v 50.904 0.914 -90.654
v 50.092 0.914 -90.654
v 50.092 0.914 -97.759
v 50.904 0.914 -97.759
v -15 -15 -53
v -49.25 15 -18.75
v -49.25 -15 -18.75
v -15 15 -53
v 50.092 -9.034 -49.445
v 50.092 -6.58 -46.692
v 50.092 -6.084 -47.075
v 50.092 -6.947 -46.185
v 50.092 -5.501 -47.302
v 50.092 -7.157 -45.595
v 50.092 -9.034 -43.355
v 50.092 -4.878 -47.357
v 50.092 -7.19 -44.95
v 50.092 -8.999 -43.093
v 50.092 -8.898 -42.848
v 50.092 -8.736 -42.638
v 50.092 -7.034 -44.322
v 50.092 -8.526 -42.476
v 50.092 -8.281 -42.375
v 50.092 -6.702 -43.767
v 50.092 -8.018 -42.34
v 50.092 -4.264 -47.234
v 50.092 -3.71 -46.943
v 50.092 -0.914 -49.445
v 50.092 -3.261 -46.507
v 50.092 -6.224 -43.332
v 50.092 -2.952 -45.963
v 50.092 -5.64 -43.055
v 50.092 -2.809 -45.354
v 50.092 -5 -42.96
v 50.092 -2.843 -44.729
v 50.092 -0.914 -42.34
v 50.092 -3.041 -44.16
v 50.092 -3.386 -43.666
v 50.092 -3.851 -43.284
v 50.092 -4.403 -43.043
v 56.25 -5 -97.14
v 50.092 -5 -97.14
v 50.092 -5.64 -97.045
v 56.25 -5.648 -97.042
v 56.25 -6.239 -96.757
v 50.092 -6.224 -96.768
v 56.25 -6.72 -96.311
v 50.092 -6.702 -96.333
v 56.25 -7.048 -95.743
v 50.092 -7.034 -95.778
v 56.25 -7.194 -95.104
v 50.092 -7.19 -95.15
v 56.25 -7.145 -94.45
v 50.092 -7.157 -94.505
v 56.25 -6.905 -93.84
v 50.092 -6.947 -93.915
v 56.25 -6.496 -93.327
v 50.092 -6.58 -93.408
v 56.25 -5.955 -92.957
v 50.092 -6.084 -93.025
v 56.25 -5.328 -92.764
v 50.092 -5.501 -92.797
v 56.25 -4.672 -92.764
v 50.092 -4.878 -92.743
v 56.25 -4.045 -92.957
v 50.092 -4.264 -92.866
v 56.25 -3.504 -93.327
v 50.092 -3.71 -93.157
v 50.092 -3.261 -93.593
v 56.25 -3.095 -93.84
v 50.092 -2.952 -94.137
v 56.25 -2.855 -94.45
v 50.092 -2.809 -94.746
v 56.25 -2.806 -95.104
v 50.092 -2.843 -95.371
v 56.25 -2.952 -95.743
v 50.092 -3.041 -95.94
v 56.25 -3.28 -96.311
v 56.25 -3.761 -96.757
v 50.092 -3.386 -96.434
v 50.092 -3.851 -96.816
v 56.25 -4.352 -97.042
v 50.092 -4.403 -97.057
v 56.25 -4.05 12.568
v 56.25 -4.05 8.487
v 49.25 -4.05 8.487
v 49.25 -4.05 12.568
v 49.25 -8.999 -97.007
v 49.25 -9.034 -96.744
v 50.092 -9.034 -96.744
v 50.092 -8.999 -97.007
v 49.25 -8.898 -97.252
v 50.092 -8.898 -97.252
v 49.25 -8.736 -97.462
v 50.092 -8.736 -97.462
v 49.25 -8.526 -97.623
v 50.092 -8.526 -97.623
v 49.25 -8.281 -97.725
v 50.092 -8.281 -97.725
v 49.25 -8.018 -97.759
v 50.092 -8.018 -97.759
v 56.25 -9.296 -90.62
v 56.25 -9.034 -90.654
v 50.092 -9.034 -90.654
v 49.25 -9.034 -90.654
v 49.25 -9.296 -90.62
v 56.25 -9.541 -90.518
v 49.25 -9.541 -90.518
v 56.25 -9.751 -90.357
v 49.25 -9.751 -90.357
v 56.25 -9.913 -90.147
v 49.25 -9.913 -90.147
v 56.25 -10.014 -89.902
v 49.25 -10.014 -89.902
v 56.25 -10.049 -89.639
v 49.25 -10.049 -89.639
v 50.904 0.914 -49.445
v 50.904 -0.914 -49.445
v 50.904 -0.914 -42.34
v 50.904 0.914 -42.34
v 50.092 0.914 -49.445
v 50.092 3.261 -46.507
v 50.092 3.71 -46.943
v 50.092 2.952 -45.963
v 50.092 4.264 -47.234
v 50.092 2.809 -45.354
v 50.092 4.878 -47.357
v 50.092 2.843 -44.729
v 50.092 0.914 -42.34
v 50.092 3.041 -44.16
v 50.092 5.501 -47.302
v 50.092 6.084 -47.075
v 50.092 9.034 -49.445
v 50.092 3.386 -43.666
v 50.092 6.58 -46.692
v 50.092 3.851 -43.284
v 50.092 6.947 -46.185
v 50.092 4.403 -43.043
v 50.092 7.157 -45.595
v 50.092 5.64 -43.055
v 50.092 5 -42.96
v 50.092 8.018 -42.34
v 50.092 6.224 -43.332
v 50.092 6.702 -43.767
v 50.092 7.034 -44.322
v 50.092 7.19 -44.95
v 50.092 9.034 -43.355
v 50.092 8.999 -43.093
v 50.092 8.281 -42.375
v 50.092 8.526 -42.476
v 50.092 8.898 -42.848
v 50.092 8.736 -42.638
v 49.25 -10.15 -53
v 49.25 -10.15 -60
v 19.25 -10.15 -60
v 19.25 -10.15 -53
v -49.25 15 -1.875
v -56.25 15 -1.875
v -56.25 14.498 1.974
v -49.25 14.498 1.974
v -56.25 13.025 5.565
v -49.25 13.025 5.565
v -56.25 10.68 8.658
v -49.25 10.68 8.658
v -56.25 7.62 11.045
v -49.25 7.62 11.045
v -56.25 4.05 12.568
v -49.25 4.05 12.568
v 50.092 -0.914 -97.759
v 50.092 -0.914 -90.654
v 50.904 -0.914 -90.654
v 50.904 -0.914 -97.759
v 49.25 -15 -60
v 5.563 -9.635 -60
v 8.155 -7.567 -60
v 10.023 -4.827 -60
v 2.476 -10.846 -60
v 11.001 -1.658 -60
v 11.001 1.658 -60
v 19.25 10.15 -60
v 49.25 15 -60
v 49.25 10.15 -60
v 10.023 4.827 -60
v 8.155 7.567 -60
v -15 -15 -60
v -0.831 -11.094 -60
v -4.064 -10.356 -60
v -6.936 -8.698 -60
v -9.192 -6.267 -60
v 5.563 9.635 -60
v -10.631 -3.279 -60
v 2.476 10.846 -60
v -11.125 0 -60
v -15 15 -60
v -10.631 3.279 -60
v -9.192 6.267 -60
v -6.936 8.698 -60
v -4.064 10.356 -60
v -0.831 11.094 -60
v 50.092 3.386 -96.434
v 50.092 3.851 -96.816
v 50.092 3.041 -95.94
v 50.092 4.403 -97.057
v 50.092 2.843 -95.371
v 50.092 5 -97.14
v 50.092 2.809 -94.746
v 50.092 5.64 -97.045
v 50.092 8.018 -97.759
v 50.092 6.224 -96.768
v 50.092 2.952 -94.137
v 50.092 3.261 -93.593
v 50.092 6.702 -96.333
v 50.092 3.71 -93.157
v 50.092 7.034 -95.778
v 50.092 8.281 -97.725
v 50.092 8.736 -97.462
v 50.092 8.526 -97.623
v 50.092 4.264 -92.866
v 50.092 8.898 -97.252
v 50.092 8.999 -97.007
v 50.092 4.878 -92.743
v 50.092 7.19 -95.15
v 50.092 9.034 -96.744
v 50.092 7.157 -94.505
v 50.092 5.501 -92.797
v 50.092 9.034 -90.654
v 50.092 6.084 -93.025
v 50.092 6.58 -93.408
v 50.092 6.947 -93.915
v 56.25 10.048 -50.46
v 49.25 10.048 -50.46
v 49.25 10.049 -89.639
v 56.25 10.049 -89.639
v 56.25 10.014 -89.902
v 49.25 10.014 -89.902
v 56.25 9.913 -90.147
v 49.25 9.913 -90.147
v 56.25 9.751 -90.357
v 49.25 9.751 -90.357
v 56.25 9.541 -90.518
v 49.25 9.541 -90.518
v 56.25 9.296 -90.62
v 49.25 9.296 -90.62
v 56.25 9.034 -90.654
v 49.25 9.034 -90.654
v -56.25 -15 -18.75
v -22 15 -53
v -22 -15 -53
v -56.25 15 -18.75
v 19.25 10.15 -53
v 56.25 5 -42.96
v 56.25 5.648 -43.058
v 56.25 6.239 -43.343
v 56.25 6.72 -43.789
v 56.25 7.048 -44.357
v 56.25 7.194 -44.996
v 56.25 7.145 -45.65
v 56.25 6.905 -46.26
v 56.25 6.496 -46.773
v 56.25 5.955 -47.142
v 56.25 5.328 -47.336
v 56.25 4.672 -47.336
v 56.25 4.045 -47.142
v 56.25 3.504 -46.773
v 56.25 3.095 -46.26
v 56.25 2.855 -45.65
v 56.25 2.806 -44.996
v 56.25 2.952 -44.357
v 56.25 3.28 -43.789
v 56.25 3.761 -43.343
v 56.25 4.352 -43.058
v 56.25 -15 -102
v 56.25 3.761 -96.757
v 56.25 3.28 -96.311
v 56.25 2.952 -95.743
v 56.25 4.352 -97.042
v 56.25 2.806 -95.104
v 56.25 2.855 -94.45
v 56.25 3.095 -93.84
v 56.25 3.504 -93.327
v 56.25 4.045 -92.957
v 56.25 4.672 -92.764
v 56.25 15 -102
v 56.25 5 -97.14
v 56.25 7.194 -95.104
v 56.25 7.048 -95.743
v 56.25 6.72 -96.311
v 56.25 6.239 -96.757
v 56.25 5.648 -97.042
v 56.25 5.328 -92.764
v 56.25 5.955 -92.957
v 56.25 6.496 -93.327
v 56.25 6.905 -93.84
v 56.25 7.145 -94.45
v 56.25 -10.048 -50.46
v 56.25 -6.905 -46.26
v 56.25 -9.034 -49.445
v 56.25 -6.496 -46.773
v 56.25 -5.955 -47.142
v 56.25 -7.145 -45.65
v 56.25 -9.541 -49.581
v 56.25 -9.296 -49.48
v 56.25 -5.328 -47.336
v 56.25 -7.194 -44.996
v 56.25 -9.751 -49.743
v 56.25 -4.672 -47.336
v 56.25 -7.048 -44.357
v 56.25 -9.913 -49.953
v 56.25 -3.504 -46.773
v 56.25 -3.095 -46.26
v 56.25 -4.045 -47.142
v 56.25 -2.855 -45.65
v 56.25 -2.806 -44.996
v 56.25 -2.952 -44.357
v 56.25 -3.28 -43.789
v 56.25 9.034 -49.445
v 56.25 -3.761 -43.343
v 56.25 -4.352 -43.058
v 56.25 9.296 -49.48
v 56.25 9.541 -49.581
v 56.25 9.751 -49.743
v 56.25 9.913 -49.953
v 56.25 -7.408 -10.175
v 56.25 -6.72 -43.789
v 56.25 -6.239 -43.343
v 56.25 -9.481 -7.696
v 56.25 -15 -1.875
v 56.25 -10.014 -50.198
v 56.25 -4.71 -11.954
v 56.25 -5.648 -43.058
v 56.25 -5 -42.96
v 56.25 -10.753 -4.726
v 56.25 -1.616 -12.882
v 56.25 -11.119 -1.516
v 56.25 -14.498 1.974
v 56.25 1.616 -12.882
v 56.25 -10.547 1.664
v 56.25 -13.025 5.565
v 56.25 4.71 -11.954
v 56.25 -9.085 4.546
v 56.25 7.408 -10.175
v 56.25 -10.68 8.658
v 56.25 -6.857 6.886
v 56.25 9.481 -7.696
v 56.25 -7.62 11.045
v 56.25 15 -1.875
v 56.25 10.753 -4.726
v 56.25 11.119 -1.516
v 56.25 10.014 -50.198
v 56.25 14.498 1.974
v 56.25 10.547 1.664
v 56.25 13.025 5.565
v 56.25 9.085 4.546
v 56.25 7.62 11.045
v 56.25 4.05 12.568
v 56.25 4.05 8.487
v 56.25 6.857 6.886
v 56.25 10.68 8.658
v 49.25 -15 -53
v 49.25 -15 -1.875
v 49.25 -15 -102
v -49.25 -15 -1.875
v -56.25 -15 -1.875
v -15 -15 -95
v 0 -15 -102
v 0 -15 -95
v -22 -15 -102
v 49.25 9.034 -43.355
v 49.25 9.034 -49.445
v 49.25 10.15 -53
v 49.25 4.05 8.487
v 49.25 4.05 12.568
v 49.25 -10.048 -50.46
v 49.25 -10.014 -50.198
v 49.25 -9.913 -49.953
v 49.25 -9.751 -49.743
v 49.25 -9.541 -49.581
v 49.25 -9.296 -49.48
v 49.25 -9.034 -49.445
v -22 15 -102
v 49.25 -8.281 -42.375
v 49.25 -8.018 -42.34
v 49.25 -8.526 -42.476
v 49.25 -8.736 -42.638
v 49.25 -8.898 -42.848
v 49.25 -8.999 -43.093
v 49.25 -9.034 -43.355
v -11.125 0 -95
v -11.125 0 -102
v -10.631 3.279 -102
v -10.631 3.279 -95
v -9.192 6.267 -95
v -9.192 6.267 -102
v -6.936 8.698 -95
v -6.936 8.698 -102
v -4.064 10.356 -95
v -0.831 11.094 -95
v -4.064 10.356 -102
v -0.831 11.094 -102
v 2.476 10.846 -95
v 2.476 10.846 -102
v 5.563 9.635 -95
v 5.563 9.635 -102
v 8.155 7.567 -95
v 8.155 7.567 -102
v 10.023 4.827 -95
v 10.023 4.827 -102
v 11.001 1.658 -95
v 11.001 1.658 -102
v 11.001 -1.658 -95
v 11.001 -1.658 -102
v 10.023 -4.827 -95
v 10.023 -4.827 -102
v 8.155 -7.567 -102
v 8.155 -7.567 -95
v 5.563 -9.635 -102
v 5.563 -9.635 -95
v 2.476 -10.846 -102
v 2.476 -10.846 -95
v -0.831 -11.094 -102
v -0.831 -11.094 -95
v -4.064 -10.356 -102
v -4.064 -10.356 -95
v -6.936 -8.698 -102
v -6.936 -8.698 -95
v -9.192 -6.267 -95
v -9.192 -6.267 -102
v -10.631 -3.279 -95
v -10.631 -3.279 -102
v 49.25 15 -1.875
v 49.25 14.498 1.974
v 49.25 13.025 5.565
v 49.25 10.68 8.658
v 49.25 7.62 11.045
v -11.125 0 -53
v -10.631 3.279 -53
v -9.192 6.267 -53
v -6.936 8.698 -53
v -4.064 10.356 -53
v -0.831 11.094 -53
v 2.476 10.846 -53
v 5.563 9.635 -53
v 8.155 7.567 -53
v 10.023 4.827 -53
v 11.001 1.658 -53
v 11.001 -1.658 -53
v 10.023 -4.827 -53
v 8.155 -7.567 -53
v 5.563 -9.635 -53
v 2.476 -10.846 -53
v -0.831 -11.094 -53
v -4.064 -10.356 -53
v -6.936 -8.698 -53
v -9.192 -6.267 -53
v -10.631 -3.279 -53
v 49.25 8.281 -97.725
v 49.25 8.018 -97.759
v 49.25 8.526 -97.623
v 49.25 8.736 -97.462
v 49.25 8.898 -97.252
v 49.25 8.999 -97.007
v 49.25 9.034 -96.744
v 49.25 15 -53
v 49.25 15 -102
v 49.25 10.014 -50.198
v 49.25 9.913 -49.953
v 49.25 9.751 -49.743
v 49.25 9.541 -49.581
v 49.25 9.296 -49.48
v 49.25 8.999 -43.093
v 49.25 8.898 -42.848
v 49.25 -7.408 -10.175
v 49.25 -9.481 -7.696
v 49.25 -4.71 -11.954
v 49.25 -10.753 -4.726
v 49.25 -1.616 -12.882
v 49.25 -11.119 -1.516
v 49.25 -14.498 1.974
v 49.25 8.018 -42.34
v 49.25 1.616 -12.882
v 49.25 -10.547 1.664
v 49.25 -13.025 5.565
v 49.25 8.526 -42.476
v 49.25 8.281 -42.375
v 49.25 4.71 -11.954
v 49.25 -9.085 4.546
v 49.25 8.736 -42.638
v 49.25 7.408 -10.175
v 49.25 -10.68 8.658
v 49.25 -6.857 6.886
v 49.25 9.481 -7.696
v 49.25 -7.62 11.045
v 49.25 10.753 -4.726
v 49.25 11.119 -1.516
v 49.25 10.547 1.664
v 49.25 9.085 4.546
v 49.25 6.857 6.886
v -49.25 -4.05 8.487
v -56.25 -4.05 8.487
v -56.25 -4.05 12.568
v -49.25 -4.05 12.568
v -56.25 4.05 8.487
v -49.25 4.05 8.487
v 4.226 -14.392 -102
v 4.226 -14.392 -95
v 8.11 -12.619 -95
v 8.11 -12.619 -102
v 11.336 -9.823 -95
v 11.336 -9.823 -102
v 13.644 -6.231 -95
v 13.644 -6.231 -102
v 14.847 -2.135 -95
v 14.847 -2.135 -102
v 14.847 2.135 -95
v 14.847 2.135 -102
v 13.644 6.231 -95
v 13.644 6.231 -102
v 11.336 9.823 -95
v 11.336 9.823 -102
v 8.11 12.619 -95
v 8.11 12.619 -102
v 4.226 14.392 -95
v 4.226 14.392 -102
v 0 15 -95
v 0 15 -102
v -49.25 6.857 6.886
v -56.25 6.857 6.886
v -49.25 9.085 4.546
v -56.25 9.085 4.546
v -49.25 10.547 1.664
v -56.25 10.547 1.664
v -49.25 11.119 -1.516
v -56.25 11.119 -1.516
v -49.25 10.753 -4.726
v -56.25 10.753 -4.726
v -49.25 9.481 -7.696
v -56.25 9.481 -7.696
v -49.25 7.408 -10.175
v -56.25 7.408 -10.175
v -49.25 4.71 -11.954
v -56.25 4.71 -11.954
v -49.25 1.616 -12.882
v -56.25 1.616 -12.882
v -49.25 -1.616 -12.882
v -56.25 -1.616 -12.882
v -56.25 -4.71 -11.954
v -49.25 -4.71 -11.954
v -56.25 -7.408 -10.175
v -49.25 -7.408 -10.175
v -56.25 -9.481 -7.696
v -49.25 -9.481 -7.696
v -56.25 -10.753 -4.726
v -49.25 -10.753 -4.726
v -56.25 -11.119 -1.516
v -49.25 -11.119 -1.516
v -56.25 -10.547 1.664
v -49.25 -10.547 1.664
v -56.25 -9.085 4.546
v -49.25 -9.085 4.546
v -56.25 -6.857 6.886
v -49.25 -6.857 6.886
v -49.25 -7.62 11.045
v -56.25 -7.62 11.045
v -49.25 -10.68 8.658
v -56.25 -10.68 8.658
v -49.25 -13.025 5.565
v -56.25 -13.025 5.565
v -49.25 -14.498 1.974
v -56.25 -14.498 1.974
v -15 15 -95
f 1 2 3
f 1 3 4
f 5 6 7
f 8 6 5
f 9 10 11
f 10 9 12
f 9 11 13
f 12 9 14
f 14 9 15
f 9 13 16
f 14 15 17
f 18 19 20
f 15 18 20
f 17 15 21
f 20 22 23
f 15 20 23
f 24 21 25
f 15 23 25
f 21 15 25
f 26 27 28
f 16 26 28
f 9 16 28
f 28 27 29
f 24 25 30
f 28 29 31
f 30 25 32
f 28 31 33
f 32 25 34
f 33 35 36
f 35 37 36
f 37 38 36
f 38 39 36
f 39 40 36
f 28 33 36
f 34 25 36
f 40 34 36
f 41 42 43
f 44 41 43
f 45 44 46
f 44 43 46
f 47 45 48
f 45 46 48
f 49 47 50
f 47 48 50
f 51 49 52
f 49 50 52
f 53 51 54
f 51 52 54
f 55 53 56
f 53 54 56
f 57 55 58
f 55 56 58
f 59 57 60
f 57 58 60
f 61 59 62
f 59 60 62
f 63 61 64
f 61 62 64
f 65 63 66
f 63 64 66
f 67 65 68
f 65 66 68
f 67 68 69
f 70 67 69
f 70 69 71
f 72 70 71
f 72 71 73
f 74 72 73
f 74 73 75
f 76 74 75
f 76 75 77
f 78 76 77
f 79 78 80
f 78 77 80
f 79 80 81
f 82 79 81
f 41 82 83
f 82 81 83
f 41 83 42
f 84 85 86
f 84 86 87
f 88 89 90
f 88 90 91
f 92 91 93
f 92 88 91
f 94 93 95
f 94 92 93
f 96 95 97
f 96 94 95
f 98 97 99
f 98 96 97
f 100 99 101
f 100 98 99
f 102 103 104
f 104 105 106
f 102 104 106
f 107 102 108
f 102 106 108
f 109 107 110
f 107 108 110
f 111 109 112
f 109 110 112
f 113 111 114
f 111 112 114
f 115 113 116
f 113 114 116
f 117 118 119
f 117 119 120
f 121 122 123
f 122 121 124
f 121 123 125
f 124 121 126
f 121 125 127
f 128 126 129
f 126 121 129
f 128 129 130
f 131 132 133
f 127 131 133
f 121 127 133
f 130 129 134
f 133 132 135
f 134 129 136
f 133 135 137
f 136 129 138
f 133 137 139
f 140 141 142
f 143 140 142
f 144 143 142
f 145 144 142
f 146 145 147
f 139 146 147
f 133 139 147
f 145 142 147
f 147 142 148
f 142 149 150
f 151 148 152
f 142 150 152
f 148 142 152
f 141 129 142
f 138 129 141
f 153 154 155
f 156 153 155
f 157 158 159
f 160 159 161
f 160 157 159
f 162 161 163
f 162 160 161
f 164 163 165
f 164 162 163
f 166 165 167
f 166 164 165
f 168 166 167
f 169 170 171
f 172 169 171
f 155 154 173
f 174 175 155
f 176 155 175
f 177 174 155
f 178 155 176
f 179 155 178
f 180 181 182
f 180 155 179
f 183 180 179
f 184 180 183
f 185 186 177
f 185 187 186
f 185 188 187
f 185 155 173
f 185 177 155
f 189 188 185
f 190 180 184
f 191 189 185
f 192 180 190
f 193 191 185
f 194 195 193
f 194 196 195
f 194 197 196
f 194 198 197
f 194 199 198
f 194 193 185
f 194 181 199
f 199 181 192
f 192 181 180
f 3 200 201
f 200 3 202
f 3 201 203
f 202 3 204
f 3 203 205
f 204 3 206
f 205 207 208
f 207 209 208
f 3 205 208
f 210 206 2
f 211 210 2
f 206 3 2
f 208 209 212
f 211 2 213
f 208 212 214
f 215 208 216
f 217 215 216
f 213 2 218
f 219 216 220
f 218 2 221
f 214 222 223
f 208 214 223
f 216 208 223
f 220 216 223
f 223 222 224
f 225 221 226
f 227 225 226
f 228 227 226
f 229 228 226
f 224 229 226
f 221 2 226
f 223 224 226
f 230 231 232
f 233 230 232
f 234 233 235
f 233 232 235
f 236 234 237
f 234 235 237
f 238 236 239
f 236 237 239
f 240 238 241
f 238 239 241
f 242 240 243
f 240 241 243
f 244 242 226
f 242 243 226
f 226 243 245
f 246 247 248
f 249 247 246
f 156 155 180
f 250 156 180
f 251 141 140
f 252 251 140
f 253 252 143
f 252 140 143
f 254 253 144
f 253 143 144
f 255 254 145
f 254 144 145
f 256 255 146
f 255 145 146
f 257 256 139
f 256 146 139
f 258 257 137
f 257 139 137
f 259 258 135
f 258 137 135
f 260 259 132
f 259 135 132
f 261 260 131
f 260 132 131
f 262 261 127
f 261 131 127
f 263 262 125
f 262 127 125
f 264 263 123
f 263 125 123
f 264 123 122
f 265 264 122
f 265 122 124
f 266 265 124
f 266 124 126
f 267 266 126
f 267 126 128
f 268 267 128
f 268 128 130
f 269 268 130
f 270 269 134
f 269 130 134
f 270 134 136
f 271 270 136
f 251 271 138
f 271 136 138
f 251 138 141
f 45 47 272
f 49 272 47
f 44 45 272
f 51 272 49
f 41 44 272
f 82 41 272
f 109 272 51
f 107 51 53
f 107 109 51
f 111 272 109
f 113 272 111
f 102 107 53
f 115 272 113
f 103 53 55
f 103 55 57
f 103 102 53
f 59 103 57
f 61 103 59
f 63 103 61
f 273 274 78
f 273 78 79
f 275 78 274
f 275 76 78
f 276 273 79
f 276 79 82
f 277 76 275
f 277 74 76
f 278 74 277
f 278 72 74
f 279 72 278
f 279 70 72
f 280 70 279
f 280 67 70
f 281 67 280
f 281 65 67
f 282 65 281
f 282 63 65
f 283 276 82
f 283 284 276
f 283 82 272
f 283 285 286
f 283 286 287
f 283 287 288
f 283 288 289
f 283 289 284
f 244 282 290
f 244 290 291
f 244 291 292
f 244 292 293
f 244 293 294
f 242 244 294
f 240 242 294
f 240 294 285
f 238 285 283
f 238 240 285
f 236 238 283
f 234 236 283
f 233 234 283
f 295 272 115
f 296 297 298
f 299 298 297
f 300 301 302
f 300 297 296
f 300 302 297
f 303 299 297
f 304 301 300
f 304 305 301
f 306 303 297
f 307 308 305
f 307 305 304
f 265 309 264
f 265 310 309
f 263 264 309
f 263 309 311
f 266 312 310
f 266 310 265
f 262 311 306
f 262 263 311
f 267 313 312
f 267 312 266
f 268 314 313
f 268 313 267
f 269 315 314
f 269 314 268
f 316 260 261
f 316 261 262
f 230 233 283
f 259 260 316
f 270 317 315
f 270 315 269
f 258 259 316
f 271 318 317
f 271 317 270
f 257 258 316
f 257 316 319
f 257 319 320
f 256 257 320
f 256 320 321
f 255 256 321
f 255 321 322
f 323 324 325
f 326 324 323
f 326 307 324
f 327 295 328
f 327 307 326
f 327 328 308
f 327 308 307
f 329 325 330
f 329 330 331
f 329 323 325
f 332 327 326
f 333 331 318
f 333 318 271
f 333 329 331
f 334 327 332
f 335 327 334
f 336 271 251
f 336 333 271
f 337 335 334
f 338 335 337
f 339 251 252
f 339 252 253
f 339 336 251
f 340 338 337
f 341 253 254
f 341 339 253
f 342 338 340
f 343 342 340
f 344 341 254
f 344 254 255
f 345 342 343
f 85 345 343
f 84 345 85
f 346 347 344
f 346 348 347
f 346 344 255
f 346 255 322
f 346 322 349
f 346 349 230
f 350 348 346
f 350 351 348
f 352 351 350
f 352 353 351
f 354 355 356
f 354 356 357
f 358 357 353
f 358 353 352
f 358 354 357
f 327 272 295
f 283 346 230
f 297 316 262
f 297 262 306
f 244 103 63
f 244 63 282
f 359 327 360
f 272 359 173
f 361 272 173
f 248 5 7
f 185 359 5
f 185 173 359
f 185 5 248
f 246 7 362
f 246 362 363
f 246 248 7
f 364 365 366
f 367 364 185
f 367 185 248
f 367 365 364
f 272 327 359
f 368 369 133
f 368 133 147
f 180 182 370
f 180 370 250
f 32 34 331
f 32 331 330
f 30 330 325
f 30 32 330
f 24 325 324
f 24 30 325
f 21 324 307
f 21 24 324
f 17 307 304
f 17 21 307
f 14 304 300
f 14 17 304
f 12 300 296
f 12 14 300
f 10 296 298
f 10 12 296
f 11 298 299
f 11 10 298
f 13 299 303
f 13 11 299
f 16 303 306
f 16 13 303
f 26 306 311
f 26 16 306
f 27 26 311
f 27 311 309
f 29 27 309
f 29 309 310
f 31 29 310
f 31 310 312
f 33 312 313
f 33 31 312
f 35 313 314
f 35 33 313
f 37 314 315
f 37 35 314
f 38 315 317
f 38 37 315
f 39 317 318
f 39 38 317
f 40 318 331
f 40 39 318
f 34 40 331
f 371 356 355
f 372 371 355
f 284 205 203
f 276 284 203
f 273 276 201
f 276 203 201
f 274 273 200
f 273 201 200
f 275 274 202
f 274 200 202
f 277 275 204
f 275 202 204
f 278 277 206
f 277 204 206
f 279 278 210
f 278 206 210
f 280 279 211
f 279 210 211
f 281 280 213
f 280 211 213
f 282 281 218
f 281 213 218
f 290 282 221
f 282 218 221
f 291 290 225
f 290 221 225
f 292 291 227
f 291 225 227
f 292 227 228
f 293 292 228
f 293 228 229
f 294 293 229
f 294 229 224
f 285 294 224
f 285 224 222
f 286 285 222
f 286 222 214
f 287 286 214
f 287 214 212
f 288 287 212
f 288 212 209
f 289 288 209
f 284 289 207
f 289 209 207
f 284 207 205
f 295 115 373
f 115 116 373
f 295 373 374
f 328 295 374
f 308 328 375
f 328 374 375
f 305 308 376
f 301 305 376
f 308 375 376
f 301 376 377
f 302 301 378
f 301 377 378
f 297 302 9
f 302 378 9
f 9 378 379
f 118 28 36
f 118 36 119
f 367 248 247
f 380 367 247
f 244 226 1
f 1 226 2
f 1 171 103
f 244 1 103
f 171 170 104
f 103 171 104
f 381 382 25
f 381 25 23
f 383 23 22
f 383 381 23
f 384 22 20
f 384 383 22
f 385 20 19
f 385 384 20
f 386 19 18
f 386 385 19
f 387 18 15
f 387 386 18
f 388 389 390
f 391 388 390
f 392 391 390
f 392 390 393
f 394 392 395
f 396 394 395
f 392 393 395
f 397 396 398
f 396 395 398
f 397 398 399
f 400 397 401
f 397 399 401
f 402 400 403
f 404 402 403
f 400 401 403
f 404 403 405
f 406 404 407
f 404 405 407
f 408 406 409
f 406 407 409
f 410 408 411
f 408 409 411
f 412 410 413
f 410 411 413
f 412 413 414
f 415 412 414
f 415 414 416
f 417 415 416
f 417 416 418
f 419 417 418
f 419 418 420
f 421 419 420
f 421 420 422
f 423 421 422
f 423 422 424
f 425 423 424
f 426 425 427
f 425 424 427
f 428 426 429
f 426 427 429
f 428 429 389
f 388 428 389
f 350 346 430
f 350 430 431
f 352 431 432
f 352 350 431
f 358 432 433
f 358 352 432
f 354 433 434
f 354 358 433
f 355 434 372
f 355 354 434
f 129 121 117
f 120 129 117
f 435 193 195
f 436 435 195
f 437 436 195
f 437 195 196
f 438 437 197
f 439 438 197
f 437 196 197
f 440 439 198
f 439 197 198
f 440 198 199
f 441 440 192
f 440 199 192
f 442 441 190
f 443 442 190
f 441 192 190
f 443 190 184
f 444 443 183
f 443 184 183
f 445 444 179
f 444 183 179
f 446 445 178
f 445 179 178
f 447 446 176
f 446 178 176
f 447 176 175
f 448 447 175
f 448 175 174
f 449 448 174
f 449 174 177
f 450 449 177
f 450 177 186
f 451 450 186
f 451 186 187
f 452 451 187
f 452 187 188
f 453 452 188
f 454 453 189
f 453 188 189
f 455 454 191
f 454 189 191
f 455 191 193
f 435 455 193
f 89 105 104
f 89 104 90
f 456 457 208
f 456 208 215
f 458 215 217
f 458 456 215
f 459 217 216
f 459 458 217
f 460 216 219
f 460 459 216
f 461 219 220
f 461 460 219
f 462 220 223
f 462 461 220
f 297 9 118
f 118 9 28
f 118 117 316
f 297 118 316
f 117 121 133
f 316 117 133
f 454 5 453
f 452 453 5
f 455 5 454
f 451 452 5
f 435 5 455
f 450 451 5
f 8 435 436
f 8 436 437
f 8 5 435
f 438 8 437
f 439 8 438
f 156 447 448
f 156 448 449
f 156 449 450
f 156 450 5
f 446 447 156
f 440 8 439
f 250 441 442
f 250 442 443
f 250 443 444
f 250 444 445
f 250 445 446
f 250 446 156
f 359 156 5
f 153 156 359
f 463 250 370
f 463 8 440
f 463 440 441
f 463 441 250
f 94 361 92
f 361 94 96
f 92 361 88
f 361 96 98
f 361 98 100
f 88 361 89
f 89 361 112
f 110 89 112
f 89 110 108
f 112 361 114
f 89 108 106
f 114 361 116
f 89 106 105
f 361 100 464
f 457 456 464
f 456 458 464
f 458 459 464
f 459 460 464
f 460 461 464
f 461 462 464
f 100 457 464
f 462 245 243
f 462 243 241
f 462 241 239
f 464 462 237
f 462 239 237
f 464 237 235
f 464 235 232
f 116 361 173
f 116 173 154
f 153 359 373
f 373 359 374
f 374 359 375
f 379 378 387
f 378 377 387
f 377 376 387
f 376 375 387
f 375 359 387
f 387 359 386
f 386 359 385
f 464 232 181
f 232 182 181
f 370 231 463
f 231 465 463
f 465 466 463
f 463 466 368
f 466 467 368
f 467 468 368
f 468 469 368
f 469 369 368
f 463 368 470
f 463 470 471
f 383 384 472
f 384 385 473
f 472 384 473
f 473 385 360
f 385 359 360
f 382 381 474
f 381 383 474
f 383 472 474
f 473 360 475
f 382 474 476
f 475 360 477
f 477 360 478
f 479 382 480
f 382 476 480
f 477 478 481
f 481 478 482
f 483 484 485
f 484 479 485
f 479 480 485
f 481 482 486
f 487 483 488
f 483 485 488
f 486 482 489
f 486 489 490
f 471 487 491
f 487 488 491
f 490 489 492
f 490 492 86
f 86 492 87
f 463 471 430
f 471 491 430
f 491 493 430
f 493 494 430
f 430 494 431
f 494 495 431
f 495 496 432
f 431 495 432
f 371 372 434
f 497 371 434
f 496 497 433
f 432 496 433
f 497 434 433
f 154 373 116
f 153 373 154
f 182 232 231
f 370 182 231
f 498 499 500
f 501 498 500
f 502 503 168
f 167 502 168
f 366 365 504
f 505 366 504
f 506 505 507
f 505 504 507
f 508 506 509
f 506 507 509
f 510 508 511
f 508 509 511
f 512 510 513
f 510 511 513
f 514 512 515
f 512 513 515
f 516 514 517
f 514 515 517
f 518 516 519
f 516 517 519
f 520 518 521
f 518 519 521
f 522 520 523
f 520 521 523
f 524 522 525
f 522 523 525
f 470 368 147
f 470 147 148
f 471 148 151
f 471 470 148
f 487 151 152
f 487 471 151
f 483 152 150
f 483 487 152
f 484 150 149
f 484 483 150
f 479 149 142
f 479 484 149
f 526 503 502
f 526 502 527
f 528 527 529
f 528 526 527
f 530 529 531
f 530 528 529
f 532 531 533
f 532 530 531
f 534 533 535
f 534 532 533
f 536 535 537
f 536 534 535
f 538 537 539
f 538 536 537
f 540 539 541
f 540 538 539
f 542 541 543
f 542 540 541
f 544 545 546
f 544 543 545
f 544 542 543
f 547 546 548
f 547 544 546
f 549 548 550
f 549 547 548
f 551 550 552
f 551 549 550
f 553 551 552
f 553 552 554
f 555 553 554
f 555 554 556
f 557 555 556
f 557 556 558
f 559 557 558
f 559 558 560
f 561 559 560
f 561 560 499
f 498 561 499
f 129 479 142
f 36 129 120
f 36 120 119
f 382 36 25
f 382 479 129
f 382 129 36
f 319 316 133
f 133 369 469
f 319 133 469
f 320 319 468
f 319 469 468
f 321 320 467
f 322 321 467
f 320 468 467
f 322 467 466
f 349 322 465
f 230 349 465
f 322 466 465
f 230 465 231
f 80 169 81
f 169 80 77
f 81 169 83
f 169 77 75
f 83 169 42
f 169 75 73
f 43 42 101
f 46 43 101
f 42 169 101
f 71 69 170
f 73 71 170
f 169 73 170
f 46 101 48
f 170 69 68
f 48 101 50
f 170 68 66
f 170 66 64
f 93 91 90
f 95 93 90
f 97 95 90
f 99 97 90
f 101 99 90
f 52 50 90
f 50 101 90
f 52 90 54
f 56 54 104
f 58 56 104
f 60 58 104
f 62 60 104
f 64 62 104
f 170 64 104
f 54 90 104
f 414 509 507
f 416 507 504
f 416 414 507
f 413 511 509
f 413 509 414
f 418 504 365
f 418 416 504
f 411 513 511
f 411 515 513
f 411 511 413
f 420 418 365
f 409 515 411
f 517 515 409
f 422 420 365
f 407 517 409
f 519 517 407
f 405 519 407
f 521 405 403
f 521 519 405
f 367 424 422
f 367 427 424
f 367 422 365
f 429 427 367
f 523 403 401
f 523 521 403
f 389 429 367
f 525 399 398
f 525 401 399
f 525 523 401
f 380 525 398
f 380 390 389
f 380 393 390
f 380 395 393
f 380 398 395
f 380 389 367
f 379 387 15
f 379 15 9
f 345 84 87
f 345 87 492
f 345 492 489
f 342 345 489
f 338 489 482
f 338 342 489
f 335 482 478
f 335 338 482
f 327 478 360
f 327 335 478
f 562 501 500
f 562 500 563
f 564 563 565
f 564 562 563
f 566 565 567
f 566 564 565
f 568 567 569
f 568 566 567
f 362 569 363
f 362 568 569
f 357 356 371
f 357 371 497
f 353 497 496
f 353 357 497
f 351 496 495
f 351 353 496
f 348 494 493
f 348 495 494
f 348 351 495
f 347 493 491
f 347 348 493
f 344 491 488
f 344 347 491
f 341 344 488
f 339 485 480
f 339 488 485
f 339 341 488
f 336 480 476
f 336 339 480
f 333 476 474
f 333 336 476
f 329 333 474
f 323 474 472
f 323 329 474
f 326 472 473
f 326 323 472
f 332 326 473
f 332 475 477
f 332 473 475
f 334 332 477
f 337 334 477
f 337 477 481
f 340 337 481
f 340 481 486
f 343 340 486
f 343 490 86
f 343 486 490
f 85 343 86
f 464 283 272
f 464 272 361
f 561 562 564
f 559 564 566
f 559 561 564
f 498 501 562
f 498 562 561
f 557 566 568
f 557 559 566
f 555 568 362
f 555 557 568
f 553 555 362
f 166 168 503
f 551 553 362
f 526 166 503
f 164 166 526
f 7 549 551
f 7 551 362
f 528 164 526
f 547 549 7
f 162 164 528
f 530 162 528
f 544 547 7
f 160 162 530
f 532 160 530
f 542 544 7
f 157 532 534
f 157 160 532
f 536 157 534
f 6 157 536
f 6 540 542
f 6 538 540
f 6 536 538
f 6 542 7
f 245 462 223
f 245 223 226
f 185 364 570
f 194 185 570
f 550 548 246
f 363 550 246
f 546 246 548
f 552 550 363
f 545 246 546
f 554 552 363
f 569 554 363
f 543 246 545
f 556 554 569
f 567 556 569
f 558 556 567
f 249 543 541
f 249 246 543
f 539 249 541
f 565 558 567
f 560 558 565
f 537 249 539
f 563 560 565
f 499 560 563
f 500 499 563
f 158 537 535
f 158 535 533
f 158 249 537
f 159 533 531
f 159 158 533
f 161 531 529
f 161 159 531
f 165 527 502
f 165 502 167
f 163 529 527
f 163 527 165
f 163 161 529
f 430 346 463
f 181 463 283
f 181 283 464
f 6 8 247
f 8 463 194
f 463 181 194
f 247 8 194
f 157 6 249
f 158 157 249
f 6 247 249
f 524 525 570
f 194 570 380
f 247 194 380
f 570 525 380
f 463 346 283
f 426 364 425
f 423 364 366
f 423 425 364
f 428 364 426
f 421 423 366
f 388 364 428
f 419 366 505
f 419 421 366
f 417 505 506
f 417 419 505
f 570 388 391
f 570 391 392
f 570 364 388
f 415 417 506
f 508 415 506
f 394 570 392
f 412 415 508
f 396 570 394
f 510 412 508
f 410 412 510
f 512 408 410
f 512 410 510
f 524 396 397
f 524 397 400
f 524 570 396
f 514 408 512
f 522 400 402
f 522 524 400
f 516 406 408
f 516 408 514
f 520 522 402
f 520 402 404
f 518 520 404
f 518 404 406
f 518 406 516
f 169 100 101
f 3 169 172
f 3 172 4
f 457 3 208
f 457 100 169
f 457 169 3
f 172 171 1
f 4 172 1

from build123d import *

# Parameters (mm, degrees)
SKETCH1_W               = 7
SKETCH1_H               = 2
SKETCH1_H_2             = 22.25
BOSS_EXTRUDE1_DEPTH     = 15
CUT_EXTRUDE1_DEPTH      = 129.379320765
CUT_EXTRUDE1_DEPTH_BACK = 129.379320765
SKETCH2_R               = 11.125
SKETCH3_R               = 11.125
CUT_EXTRUDE2_DEPTH      = 7
SKETCH6_W               = 30
SKETCH6_H               = 20.3
CUT_EXTRUDE3_DEPTH      = 7
SKETCH7_R               = 2.2
CUT_EXTRUDE4_DEPTH      = 10
CAVITY3_START           = 49.25
CAVITY3_DEPTH           = 0.842
CAVITY3_2_DEPTH         = 6.6275
CAVITY3_START_2         = 55.8775
CAVITY3_3_DEPTH         = 0.3725
CAVITY3_START_3         = -0.9135
CAVITY3_4_DEPTH         = 1.827
CUT_EXTRUDE5_DEPTH      = 10
CUT_EXTRUDE6_DEPTH      = 0.842
CUT_EXTRUDE7_START      = -7.105
SKETCH10_W              = 0.812
SKETCH10_H              = 1.827
CUT_EXTRUDE7_DEPTH      = 7.105
SKETCH11_W              = 7
SKETCH11_H              = 30
BOSS_EXTRUDE2_DEPTH     = 42
CAVITY4_START           = 49.25
CAVITY4_DEPTH           = 7
CAVITY4_2_DEPTH         = 6.6275
CAVITY4_3_DEPTH         = 0.842
CAVITY4_START_2         = -0.9135
CAVITY4_4_DEPTH         = 1.827
CUT_EXTRUDE8_DEPTH      = 42
MIRROR3_COPY_1_SKETCH_R = 2.2
MIRROR3_COPY_1_DEPTH    = 10
MIRROR3_COPY_2_SKETCH_R = 2.2
MIRROR3_COPY_2_DEPTH    = 10
MIRROR3_COPY_3_DEPTH    = 0.842
CUT_EXTRUDE9_DEPTH      = 42
BOSS_EXTRUDE3_DEPTH     = 30
SKETCH15_R              = 11.125
BOSS_EXTRUDE4_DEPTH     = 7
BOSS_EXTRUDE5_REACH     = 131.007
SKETCH16_W              = 7
SKETCH16_H              = 30
SKETCH17_W              = 9.798681855
SKETCH17_H              = 8.1
CUT_EXTRUDE10_DEPTH     = 153.595052344


with BuildPart() as part:
    # Sketch1 → Boss-Extrude1 (new, symmetric)
    with BuildSketch(Plane(origin=(0, 0, 0), x_dir=(1, 0, 0), z_dir=(0, 1, 0))):
        with Locations((-52.75, -12.125)):
            Rectangle(SKETCH1_W, SKETCH1_H)
        with Locations((-52.75, 0)):
            Rectangle(SKETCH1_W, SKETCH1_H_2)
        Polygon((-49.25, 11.125), (-49.25, 53), (49.25, 53), (49.25, 11.125), (56.25, 11.125), (56.25, 60), (-56.25, 60), (-56.25, 11.125), align=None)
        with Locations((52.75, 0)):
            Rectangle(SKETCH1_W, SKETCH1_H_2)
        with Locations((52.75, -12.125)):
            Rectangle(SKETCH1_W, SKETCH1_H)
    extrude(amount=BOSS_EXTRUDE1_DEPTH, both=True)

    # Sketch2 → Cut-Extrude1 (cut, two sides: drawn at the far end of the back side and taken through both)
    with BuildSketch(Plane.ZY.offset(56.25).offset(-CUT_EXTRUDE1_DEPTH_BACK)):
        with Locations((-1.875, 0)):
            Circle(SKETCH2_R)
        with BuildLine():
            Line((13.125, 15), (-1.875, 15))
            ThreePointArc((-1.875, 15), (8.731601718, 10.606601718), (13.125, 0))
            Line((13.125, 0), (13.125, 15))
        make_face()
        with BuildLine():
            Line((13.125, -15), (13.125, 0))
            ThreePointArc((13.125, 0), (8.731601718, -10.606601718), (-1.875, -15))
            Line((-1.875, -15), (13.125, -15))
        make_face()
    extrude(amount=CUT_EXTRUDE1_DEPTH + CUT_EXTRUDE1_DEPTH_BACK, mode=Mode.SUBTRACT)

    # Sketch3 → Cut-Extrude2 (cut)
    with BuildSketch(Plane(origin=(0, 0, -60), x_dir=(-1, 0, 0), z_dir=(0, 0, -1))):
        Circle(SKETCH3_R)
    extrude(amount=-CUT_EXTRUDE2_DEPTH, mode=Mode.SUBTRACT)

    # Sketch6 → Cut-Extrude3 (cut)
    with BuildSketch(Plane(origin=(0, 0, -60), x_dir=(-1, 0, 0), z_dir=(0, 0, -1))):
        with Locations((-34.25, 0)):
            Rectangle(SKETCH6_W, SKETCH6_H)
    extrude(amount=-CUT_EXTRUDE3_DEPTH, mode=Mode.SUBTRACT)

    # Sketch7 → Cut-Extrude4 (cut)
    with BuildSketch(Plane.ZY.offset(-49.25)):
        with Locations((-45.160353728, 5)):
            Circle(SKETCH7_R)
    cut_extrude4 = extrude(amount=-CUT_EXTRUDE4_DEPTH, mode=Mode.SUBTRACT)

    # Cavity3: read off the stored shape, not the designer's step
    # Cavity3 outline → Cavity3 (cut)
    with BuildSketch(Plane.YZ.offset(CAVITY3_START)):
        with BuildLine():
            Line((-3.80625, -42.340467029), (-3.80625, -42.949467029))
            ThreePointArc((-3.80625, -42.949467029), (-5.075, -47.020009529), (-6.34375, -42.949467029))
            Line((-6.34375, -42.949467029), (-6.34375, -42.340467029))
            Line((-6.34375, -42.340467029), (-8.0185, -42.340467029))
            ThreePointArc((-8.0185, -42.340467029), (-8.736213383, -42.637753646), (-9.0335, -43.355467029))
            Line((-9.0335, -43.355467029), (-9.0335, -49.445467029))
            Line((-9.0335, -49.445467029), (9.0335, -49.445467029))
            Line((9.0335, -49.445467029), (9.0335, -43.355467029))
            ThreePointArc((9.0335, -43.355467029), (8.736213383, -42.637753646), (8.0185, -42.340467029))
            Line((8.0185, -42.340467029), (6.34375, -42.340467029))
            Line((6.34375, -42.340467029), (6.34375, -42.949467029))
            ThreePointArc((6.34375, -42.949467029), (7.209542976, -44.131254024), (7.156577631, -45.595293863))
            ThreePointArc((7.156577631, -45.595293863), (4.566705044, -47.317262507), (2.842761328, -44.728704204))
            ThreePointArc((2.842761328, -44.728704204), (3.111418667, -43.723695206), (3.80625, -42.949467029))
            Line((3.80625, -42.949467029), (3.80625, -42.340467029))
            Line((3.80625, -42.340467029), (-3.80625, -42.340467029))
        make_face()
    extrude(amount=CAVITY3_DEPTH, mode=Mode.SUBTRACT)

    # Cavity3 2 outline → Cavity3 2 (cut)
    with BuildSketch(Plane.YZ.offset(CAVITY3_START)):
        with BuildLine():
            ThreePointArc((10.0485, -50.460467029), (9.751213383, -49.742753646), (9.0335, -49.445467029))
            Line((9.0335, -49.445467029), (-9.0335, -49.445467029))
            ThreePointArc((-9.0335, -49.445467029), (-9.751213383, -49.742753646), (-10.0485, -50.460467029))
            Line((-10.0485, -50.460467029), (-10.0485, -60))
            Line((-10.0485, -60), (10.0485, -60))
            Line((10.0485, -60), (10.0485, -50.460467029))
        make_face()
    extrude(amount=CAVITY3_2_DEPTH, mode=Mode.SUBTRACT)

    # Cavity3 3 outline → Cavity3 3 (cut)
    with BuildSketch(Plane.YZ.offset(CAVITY3_START_2)):
        with BuildLine():
            Line((-9.744, -60), (9.744, -60))
            Line((9.744, -60), (9.744, -50.511217029))
            ThreePointArc((9.744, -50.511217029), (9.521035037, -49.972931992), (8.98275, -49.749967029))
            Line((8.98275, -49.749967029), (-8.98275, -49.749967029))
            ThreePointArc((-8.98275, -49.749967029), (-9.521035037, -49.972931992), (-9.744, -50.511217029))
            Line((-9.744, -50.511217029), (-9.744, -60))
        make_face()
    extrude(amount=CAVITY3_3_DEPTH, mode=Mode.SUBTRACT)

    # Cavity3 4 outline → Cavity3 4 (cut)
    with BuildSketch(Plane(origin=(0, 0, 0), x_dir=(1, 0, 0), z_dir=(0, 1, 0)).offset(CAVITY3_START_3)):
        Polygon((50.092, 49.445467029), (50.092, 42.340467029), (50.904, 49.445467029), align=None)
    extrude(amount=CAVITY3_4_DEPTH, mode=Mode.SUBTRACT)

    # Mirror1: Cut-Extrude4 across plane
    add(cut_extrude4.mirror(Plane.ZX), mode=Mode.SUBTRACT)

    # Sketch8 → Cut-Extrude5 (cut)
    with BuildSketch(Plane.ZY.offset(-55.8775)):
        with BuildLine():
            Line((-60, -10.0485), (-50.460467029, -10.0485))
            ThreePointArc((-50.460467029, -10.0485), (-49.742753646, -9.751213383), (-49.445467029, -9.0335))
            Line((-49.445467029, -9.0335), (-49.445467029, 9.0335))
            ThreePointArc((-49.445467029, 9.0335), (-49.742753646, 9.751213383), (-50.460467029, 10.0485))
            Line((-50.460467029, 10.0485), (-60, 10.0485))
            Line((-60, 10.0485), (-60, 9.744))
            Line((-60, 9.744), (-50.511217029, 9.744))
            ThreePointArc((-50.511217029, 9.744), (-49.972931992, 9.521035037), (-49.749967029, 8.98275))
            Line((-49.749967029, 8.98275), (-49.749967029, -8.98275))
            ThreePointArc((-49.749967029, -8.98275), (-49.972931992, -9.521035037), (-50.511217029, -9.744))
            Line((-50.511217029, -9.744), (-60, -9.744))
            Line((-60, -9.744), (-60, -10.0485))
        make_face()
    cut_extrude5 = extrude(amount=-CUT_EXTRUDE5_DEPTH, mode=Mode.SUBTRACT)

    # Sketch9 → Cut-Extrude6 (cut)
    with BuildSketch(Plane.ZY.offset(-49.25)):
        with BuildLine():
            Line((-42.340467029, 6.34375), (-42.340467029, 3.80625))
            Line((-42.340467029, 3.80625), (-42.949467029, 3.80625))
            ThreePointArc((-42.949467029, 3.80625), (-43.723695206, 3.111418667), (-44.728704204, 2.842761328))
            ThreePointArc((-44.728704204, 2.842761328), (-43.003444949, 5.433294956), (-45.595293863, 7.156577631))
            ThreePointArc((-45.595293863, 7.156577631), (-44.131254024, 7.209542976), (-42.949467029, 6.34375))
            Line((-42.949467029, 6.34375), (-42.340467029, 6.34375))
        make_face()
    cut_extrude6 = extrude(amount=-CUT_EXTRUDE6_DEPTH, mode=Mode.SUBTRACT)

    # Mirror2: Cut-Extrude6 across plane
    add(cut_extrude6.mirror(Plane.ZX), mode=Mode.SUBTRACT)

    # Sketch10 → Cut-Extrude7 (cut)
    with BuildSketch(Plane(origin=(0, 0, -49.445467029), x_dir=(-1, 0, 0), z_dir=(0, 0, -1)).offset(CUT_EXTRUDE7_START)):
        with Locations((-50.498, 0)):
            Rectangle(SKETCH10_W, SKETCH10_H)
    cut_extrude7 = extrude(amount=CUT_EXTRUDE7_DEPTH, mode=Mode.SUBTRACT)

    # Sketch11 → Boss-Extrude2 (add)
    with BuildSketch(Plane(origin=(0, 0, -60), x_dir=(-1, 0, 0), z_dir=(0, 0, -1))):
        with Locations((-52.75, 0)):
            Rectangle(SKETCH11_W, SKETCH11_H)
    extrude(amount=BOSS_EXTRUDE2_DEPTH)

    # Cavity4: read off the stored shape, not the designer's step
    # Cavity4 outline → Cavity4 (cut)
    with BuildSketch(Plane.YZ.offset(CAVITY4_START)):
        with BuildLine():
            Line((9.744, -60), (-9.744, -60))
            Line((-9.744, -60), (-9.744, -89.588717029))
            ThreePointArc((-9.744, -89.588717029), (-9.521035037, -90.127002066), (-8.98275, -90.349967029))
            Line((-8.98275, -90.349967029), (8.98275, -90.349967029))
            ThreePointArc((8.98275, -90.349967029), (9.521035037, -90.127002066), (9.744, -89.588717029))
            Line((9.744, -89.588717029), (9.744, -60))
        make_face()
    extrude(amount=CAVITY4_DEPTH, mode=Mode.SUBTRACT)

    # Cavity4 2 outline → Cavity4 2 (cut)
    with BuildSketch(Plane.YZ.offset(CAVITY4_START)):
        with BuildLine():
            Line((-9.0335, -90.654467029), (9.0335, -90.654467029))
            ThreePointArc((9.0335, -90.654467029), (9.751213383, -90.357180412), (10.0485, -89.639467029))
            Line((10.0485, -89.639467029), (10.0485, -60))
            Line((10.0485, -60), (9.744, -60))
            Line((9.744, -60), (9.744, -89.588717029))
            ThreePointArc((9.744, -89.588717029), (9.521035037, -90.127002066), (8.98275, -90.349967029))
            Line((8.98275, -90.349967029), (-8.98275, -90.349967029))
            ThreePointArc((-8.98275, -90.349967029), (-9.521035037, -90.127002066), (-9.744, -89.588717029))
            Line((-9.744, -89.588717029), (-9.744, -60))
            Line((-9.744, -60), (-10.0485, -60))
            Line((-10.0485, -60), (-10.0485, -89.639467029))
            ThreePointArc((-10.0485, -89.639467029), (-9.751213383, -90.357180412), (-9.0335, -90.654467029))
        make_face()
    extrude(amount=CAVITY4_2_DEPTH, mode=Mode.SUBTRACT)

    # Cavity4 3 outline → Cavity4 3 (cut)
    with BuildSketch(Plane.YZ.offset(CAVITY4_START)):
        with BuildLine():
            Line((-9.0335, -90.654467029), (-9.0335, -96.744467029))
            ThreePointArc((-9.0335, -96.744467029), (-8.736213383, -97.462180412), (-8.0185, -97.759467029))
            Line((-8.0185, -97.759467029), (-6.34375, -97.759467029))
            Line((-6.34375, -97.759467029), (-6.34375, -97.150467029))
            ThreePointArc((-6.34375, -97.150467029), (-5.075, -93.07992453), (-3.80625, -97.150467029))
            Line((-3.80625, -97.150467029), (-3.80625, -97.759467029))
            Line((-3.80625, -97.759467029), (3.80625, -97.759467029))
            Line((3.80625, -97.759467029), (3.80625, -97.150467029))
            ThreePointArc((3.80625, -97.150467029), (5.075, -93.07992453), (6.34375, -97.150467029))
            Line((6.34375, -97.150467029), (6.34375, -97.759467029))
            Line((6.34375, -97.759467029), (8.0185, -97.759467029))
            ThreePointArc((8.0185, -97.759467029), (8.736213383, -97.462180412), (9.0335, -96.744467029))
            Line((9.0335, -96.744467029), (9.0335, -90.654467029))
            Line((9.0335, -90.654467029), (-9.0335, -90.654467029))
        make_face()
    extrude(amount=CAVITY4_3_DEPTH, mode=Mode.SUBTRACT)

    # Cavity4 4 outline → Cavity4 4 (cut)
    with BuildSketch(Plane(origin=(0, 0, 0), x_dir=(1, 0, 0), z_dir=(0, 1, 0)).offset(CAVITY4_START_2)):
        Polygon((50.904, 90.654467029), (50.092, 97.759467029), (50.092, 90.654467029), align=None)
    extrude(amount=CAVITY4_4_DEPTH, mode=Mode.SUBTRACT)

    # Sketch12 → Cut-Extrude8 (cut)
    with BuildSketch(Plane.ZY.offset(-55.8775)):
        with BuildLine():
            Line((-60, 10.0485), (-89.639467029, 10.0485))
            ThreePointArc((-89.639467029, 10.0485), (-90.357180412, 9.751213383), (-90.654467029, 9.0335))
            Line((-90.654467029, 9.0335), (-90.654467029, -9.0335))
            ThreePointArc((-90.654467029, -9.0335), (-90.357180412, -9.751213383), (-89.639467029, -10.0485))
            Line((-89.639467029, -10.0485), (-60, -10.0485))
            Line((-60, -10.0485), (-60, -9.744))
            Line((-60, -9.744), (-89.588717029, -9.744))
            ThreePointArc((-89.588717029, -9.744), (-90.127002066, -9.521035037), (-90.349967029, -8.98275))
            Line((-90.349967029, -8.98275), (-90.349967029, 8.98275))
            ThreePointArc((-90.349967029, 8.98275), (-90.127002066, 9.521035037), (-89.588717029, 9.744))
            Line((-89.588717029, 9.744), (-60, 9.744))
            Line((-60, 9.744), (-60, 10.0485))
        make_face()
    extrude(amount=-CUT_EXTRUDE8_DEPTH, mode=Mode.SUBTRACT)

    # Mirror3: Cut-Extrude5, Cut-Extrude6, Cut-Extrude7 across plane
    add(cut_extrude5.mirror(Plane(origin=(0, 0, -70.049967029), x_dir=(1, 0, 0), z_dir=(0, 0, -1))), mode=Mode.SUBTRACT)
    add(cut_extrude6.mirror(Plane(origin=(0, 0, -70.049967029), x_dir=(1, 0, 0), z_dir=(0, 0, -1))), mode=Mode.SUBTRACT)
    add(cut_extrude7.mirror(Plane(origin=(0, 0, -70.049967029), x_dir=(1, 0, 0), z_dir=(0, 0, -1))), mode=Mode.SUBTRACT)

    # Mirror3 copy 1 sketch → Mirror3 copy 1 (cut)
    with BuildSketch(Plane(origin=(49.25, 0, -140.099934058), x_dir=(0, 0, -1), z_dir=(-1, 0, 0))):
        with Locations((-45.160353728, 5)):
            Circle(MIRROR3_COPY_1_SKETCH_R)
    extrude(amount=-MIRROR3_COPY_1_DEPTH, mode=Mode.SUBTRACT)

    # Mirror3 copy 2 sketch → Mirror3 copy 2 (cut)
    with BuildSketch(Plane(origin=(49.25, 0, -140.099934058), x_dir=(0, 0, -1), z_dir=(-1, 0, 0))):
        with Locations((-45.160353728, -5)):
            Circle(MIRROR3_COPY_2_SKETCH_R)
    extrude(amount=-MIRROR3_COPY_2_DEPTH, mode=Mode.SUBTRACT)

    # Mirror3 copy 3 sketch → Mirror3 copy 3 (cut)
    with BuildSketch(Plane(origin=(49.25, 0, -140.099934058), x_dir=(0, 0, -1), z_dir=(-1, 0, 0))):
        with BuildLine():
            Line((-42.340467029, 6.34375), (-42.340467029, 3.80625))
            Line((-42.340467029, 3.80625), (-42.949467029, 3.80625))
            ThreePointArc((-42.949467029, 3.80625), (-43.723695206, 3.111418667), (-44.728704204, 2.842761328))
            ThreePointArc((-44.728704204, 2.842761328), (-43.003444949, 5.433294956), (-45.595293863, 7.156577631))
            ThreePointArc((-45.595293863, 7.156577631), (-44.131254024, 7.209542976), (-42.949467029, 6.34375))
            Line((-42.949467029, 6.34375), (-42.340467029, 6.34375))
        make_face()
    extrude(amount=-MIRROR3_COPY_3_DEPTH, mode=Mode.SUBTRACT)

    # Sketch13 → Cut-Extrude9 (cut)
    with BuildSketch(Plane(origin=(0, 15, 0), x_dir=(1, 0, 0), z_dir=(0, 1, 0))):
        Polygon((-56.25, 60), (-56.25, 18.75), (-15, 60), align=None)
    extrude(amount=-CUT_EXTRUDE9_DEPTH, mode=Mode.SUBTRACT)


with BuildPart() as cut_extrude9_piece_1:
    # of the separate pieces the step leaves, piece 1, a body of its own (cut_extrude9_pieces)
    add(part.part.solids().sort_by_distance((49.25, 15, -60))[0])



with BuildPart() as cut_extrude9_piece_2:
    # of the separate pieces the step leaves, piece 2, a body of its own (cut_extrude9_pieces)
    add(part.part.solids().sort_by_distance((-56.25, 15, -1.875))[0])


with BuildPart() as cut_extrude9_piece_1_1:
    add(cut_extrude9_piece_1.part)

    add(cut_extrude9_piece_2.part)  # Boss-Extrude3 merges Cut-Extrude9 piece 2
    # Sketch13<3> → Boss-Extrude3 (add)
    with BuildSketch(Plane(origin=(0, 15, 0), x_dir=(1, 0, 0), z_dir=(0, 1, 0))):
        Polygon((-49.25, 25.75), (-49.25, 18.75), (-15, 53), (-22, 53), align=None)
    extrude(amount=-BOSS_EXTRUDE3_DEPTH)



with BuildPart() as body_2:
    # Sketch15 → Boss-Extrude4 (new body)
    with BuildSketch(Plane(origin=(0, 0, -102), x_dir=(-1, 0, 0), z_dir=(0, 0, -1))):
        with BuildLine():
            Line((0, 15), (15, 15))
            Line((15, 15), (15, -15))
            Line((15, -15), (0, -15))
            ThreePointArc((0, -15), (-15, 0), (0, 15))
        make_face()
        Circle(SKETCH15_R, mode=Mode.SUBTRACT)
    extrude(amount=-BOSS_EXTRUDE4_DEPTH)


with BuildPart() as cut_extrude9_piece_1_2:
    add(cut_extrude9_piece_1_1.part)

    add(body_2.part)  # Boss-Extrude5 merges body 2
    # Boss-Extrude5: up to this plane
    boss_extrude5_end = Plane(origin=(-37.5, -27, -37.5), z_dir=(0.7071067811865447, 0, 0.7071067811865505))
    # Sketch16 → Boss-Extrude5 (add, up to the surface)
    with BuildSketch(Plane(origin=(0, 0, -102), x_dir=(-1, 0, 0), z_dir=(0, 0, -1)), mode=Mode.PRIVATE) as boss_extrude5_sk1:
        with Locations((18.5, 0)):
            Rectangle(SKETCH16_W, SKETCH16_H)
    boss_extrude5_tool1 = split(extrude(boss_extrude5_sk1.sketch, amount=-BOSS_EXTRUDE5_REACH, mode=Mode.PRIVATE), bisect_by=boss_extrude5_end, keep=Keep.BOTH, mode=Mode.PRIVATE)
    add(boss_extrude5_tool1.solids().sort_by_distance((-18.5, 0, -102))[0])

    # Sketch17 → Cut-Extrude10 (cut, through all)
    with BuildSketch(Plane.ZY.offset(56.25)):
        with Locations((8.225659073, 0)):
            Rectangle(SKETCH17_W, SKETCH17_H)
    extrude(amount=-CUT_EXTRUDE10_DEPTH, mode=Mode.SUBTRACT)


solid = cut_extrude9_piece_1_2.part
